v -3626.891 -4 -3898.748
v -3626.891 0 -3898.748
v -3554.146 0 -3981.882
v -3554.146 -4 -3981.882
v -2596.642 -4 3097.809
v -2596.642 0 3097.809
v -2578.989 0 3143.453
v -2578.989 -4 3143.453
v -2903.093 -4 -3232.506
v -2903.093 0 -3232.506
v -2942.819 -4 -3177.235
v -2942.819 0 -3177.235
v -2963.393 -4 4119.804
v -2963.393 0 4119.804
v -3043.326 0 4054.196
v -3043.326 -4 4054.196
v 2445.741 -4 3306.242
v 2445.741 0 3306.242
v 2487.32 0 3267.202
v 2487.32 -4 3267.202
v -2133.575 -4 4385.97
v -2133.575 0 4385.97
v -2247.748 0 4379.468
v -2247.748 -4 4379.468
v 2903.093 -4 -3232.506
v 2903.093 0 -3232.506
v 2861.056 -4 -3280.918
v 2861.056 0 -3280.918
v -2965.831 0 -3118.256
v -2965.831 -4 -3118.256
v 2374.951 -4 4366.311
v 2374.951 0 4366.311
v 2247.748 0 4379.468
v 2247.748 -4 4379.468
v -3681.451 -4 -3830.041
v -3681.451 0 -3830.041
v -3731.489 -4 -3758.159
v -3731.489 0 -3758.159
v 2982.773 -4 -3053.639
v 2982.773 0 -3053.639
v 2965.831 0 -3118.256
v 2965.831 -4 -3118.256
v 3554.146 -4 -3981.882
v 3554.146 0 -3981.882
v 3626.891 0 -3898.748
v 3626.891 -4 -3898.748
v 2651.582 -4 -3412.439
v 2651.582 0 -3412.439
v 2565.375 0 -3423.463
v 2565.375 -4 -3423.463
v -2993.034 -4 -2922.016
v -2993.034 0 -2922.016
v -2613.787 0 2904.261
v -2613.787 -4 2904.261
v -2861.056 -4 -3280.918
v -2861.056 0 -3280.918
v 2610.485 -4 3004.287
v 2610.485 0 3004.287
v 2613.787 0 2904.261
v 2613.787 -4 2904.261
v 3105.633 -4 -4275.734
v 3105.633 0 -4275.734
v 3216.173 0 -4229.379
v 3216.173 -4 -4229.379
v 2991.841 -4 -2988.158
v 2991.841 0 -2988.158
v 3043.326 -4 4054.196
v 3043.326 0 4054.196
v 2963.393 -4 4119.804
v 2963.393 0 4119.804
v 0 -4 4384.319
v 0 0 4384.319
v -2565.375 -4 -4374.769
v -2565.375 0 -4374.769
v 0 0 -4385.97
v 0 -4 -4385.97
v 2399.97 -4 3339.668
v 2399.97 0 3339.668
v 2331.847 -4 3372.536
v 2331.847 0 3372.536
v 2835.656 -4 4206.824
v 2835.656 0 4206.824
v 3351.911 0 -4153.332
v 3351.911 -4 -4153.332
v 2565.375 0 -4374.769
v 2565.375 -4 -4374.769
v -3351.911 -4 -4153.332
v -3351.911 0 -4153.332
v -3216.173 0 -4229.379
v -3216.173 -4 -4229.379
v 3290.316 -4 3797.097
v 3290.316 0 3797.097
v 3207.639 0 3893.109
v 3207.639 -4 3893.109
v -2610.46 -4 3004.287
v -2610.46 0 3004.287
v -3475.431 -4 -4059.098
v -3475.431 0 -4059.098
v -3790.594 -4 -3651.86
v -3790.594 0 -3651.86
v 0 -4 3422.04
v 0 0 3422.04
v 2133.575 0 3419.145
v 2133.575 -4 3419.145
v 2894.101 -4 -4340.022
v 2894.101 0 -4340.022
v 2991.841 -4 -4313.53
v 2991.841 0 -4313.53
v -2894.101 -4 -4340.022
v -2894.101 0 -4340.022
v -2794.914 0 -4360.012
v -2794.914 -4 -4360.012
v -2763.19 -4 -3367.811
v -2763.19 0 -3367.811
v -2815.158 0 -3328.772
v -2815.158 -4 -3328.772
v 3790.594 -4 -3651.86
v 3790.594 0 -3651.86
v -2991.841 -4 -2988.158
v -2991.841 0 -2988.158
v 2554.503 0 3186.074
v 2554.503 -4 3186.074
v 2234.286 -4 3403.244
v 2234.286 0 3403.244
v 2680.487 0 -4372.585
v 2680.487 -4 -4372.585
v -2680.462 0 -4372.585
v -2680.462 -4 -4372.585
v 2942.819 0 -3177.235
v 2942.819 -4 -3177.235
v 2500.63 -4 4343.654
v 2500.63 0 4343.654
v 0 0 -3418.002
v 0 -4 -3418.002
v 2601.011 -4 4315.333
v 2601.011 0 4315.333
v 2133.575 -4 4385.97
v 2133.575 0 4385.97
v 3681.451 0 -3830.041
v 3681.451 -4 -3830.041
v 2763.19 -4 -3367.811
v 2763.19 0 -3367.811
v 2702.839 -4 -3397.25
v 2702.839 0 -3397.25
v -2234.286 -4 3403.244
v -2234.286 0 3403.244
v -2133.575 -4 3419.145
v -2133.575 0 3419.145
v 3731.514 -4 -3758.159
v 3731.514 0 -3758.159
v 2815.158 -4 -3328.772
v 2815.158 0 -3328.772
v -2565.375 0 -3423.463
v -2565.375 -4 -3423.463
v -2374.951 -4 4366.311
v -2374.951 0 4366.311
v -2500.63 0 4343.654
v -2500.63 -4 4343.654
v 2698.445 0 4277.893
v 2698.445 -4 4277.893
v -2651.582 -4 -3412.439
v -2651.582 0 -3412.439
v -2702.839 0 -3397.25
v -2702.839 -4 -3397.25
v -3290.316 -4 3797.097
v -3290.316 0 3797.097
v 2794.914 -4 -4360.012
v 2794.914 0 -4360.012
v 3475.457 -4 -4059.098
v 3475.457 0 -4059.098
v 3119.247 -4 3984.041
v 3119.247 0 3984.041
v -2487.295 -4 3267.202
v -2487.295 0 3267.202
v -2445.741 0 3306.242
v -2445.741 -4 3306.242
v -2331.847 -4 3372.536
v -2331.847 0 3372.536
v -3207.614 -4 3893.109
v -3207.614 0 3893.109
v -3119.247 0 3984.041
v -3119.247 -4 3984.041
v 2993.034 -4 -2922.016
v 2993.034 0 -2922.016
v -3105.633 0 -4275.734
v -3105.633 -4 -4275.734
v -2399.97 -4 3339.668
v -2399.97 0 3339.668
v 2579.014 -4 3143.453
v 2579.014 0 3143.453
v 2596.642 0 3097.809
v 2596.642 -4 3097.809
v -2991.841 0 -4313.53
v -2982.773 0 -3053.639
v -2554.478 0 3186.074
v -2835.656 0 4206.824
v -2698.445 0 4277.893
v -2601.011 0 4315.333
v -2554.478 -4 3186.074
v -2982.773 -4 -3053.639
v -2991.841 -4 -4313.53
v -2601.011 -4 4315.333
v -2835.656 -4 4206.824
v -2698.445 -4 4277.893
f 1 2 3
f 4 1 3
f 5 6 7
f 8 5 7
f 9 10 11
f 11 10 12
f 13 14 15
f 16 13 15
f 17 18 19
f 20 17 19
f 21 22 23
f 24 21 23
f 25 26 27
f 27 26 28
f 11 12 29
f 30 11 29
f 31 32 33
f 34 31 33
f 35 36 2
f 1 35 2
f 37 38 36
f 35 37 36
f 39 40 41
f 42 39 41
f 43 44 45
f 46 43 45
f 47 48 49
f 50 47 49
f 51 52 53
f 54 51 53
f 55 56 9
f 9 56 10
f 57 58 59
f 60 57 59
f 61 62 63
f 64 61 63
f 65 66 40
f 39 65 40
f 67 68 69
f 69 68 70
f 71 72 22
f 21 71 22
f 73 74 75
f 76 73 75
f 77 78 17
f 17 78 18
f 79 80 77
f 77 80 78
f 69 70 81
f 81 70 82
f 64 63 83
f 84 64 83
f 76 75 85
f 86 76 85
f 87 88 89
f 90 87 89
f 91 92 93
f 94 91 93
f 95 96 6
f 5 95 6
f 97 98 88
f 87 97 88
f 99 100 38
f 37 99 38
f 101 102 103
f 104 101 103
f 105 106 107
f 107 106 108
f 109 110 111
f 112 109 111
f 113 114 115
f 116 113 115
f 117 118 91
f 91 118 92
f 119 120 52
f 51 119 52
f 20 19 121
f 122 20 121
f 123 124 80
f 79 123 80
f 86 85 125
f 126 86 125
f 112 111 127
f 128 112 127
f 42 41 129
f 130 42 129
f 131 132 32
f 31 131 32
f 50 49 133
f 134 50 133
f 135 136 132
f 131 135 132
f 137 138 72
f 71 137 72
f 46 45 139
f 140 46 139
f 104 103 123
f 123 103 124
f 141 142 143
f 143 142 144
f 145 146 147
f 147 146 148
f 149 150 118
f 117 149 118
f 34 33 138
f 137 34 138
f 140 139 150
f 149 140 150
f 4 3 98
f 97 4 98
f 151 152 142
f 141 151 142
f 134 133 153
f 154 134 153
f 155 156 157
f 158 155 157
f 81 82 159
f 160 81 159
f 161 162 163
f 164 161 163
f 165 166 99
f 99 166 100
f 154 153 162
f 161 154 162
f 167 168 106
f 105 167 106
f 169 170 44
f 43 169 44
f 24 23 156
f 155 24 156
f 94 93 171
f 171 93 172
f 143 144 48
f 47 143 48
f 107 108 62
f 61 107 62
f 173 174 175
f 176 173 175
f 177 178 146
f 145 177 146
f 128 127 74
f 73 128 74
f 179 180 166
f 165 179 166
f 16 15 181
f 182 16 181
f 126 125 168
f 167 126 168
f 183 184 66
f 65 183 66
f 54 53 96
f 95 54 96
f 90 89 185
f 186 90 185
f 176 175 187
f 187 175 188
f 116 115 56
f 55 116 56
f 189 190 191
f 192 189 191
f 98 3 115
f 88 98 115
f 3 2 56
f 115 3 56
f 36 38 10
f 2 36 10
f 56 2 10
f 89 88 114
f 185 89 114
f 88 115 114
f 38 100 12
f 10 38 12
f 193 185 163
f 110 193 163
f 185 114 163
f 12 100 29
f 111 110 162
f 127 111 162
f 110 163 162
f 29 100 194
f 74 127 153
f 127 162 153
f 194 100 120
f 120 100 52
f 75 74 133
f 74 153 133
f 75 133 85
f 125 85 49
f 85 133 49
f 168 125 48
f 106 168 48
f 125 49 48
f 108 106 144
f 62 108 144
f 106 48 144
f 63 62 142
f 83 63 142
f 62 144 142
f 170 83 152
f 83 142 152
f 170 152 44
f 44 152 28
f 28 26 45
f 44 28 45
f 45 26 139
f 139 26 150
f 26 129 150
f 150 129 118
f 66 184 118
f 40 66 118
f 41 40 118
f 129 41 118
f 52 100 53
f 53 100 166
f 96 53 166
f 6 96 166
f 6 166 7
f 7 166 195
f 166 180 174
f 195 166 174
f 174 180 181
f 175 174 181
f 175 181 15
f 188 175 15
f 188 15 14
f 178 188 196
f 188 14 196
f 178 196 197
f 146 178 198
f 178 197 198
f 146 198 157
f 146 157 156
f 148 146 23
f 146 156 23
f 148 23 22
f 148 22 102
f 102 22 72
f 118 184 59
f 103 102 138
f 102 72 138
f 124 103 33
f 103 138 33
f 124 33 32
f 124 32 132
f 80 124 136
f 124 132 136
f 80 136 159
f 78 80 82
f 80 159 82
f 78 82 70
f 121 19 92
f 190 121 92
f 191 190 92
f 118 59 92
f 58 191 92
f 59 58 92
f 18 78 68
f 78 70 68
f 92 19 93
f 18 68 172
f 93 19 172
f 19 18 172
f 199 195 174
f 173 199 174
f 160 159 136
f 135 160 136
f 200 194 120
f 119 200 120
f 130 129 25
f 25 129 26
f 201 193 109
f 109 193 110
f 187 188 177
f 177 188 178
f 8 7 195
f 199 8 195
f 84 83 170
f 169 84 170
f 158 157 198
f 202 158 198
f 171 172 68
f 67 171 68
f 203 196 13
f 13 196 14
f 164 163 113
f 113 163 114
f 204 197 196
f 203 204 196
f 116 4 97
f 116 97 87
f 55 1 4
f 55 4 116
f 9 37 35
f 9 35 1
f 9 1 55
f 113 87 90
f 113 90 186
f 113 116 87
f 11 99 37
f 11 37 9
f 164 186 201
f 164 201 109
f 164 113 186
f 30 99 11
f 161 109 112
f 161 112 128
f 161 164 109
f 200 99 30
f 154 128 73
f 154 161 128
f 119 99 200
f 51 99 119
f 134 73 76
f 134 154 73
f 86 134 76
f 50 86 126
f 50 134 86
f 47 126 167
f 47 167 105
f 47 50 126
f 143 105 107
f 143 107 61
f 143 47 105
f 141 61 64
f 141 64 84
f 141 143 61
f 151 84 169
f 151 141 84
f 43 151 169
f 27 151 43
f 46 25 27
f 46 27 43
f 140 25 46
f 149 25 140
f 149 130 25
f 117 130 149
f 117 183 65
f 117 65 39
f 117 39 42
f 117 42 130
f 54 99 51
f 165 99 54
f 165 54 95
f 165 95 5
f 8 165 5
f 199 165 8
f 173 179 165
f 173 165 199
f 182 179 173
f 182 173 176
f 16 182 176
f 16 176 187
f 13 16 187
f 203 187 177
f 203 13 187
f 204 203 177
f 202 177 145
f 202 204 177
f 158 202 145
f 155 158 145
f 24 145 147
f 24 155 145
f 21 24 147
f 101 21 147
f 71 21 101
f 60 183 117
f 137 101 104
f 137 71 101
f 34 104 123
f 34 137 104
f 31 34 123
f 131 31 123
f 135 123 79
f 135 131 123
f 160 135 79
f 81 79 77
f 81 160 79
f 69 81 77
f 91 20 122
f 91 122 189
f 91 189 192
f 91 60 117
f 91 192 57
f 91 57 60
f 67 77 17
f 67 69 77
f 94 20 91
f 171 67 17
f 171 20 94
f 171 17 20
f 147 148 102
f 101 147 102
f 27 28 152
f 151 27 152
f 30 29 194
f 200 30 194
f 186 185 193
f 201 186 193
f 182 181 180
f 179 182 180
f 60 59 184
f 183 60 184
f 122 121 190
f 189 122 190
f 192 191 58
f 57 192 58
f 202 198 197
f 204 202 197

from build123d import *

# Parameters (mm, degrees)
F1_DEPTH = 4


with BuildPart() as f1:
    # F0 (on Front) → F1 (new body)
    with BuildSketch(Plane.XZ):
        Polygon((-3207.6136, 3893.1088), (-3290.316, 3797.0968), (-3790.5944, -3651.8596), (-3731.4886, -3758.1586), (-3681.4506, -3830.0406), (-3626.8914, -3898.7476), (-3554.1458, -3981.8818), (-3475.4312, -4059.0978), (-3351.911, -4153.3318), (-3216.1734, -4229.3794), (-3105.6326, -4275.7344), (-2991.8406, -4313.5296), (-2894.1014, -4340.0218), (-2794.9144, -4360.0116), (-2680.462, -4372.5846), (-2565.3746, -4374.769), (0, -4385.9704), (2565.3746, -4374.769), (2680.4874, -4372.5846), (2794.9144, -4360.0116), (2894.1014, -4340.0218), (2991.8406, -4313.5296), (3105.6326, -4275.7344), (3216.1734, -4229.3794), (3351.911, -4153.3318), (3475.4566, -4059.0978), (3554.1458, -3981.8818), (3626.8914, -3898.7476), (3681.4506, -3830.0406), (3731.514, -3758.1586), (3790.5944, -3651.8596), (3290.316, 3797.0968), (3207.639, 3893.1088), (3119.247, 3984.0408), (3043.3264, 4054.1956), (2963.3926, 4119.8038), (2835.656, 4206.8242), (2698.4452, 4277.8934), (2601.0108, 4315.333), (2500.63, 4343.654), (2374.9508, 4366.3108), (2247.7476, 4379.468), (2133.5746, 4385.9704), (0, 4384.3194), (-2133.5746, 4385.9704), (-2247.7476, 4379.468), (-2374.9508, 4366.3108), (-2500.63, 4343.654), (-2601.0108, 4315.333), (-2698.4452, 4277.8934), (-2835.656, 4206.8242), (-2963.3926, 4119.8038), (-3043.3264, 4054.1956), (-3119.247, 3984.0408), align=None)
        Polygon((-2133.5746, 3419.1448), (0, 3422.0404), (2133.5746, 3419.1448), (2234.2856, 3403.2444), (2331.847, 3372.5358), (2399.9698, 3339.6682), (2445.7406, 3306.2418), (2487.3204, 3267.202), (2554.5034, 3186.0744), (2579.0144, 3143.4532), (2596.642, 3097.8094), (2610.485, 3004.2866), (2613.787, 2904.2614), (2993.0344, -2922.016), (2991.8406, -2988.1576), (2982.7728, -3053.6388), (2965.831, -3118.2564), (2942.8186, -3177.2352), (2903.093, -3232.5056), (2861.056, -3280.918), (2815.1582, -3328.7716), (2763.1898, -3367.8114), (2702.8394, -3397.25), (2651.5822, -3412.4392), (2565.3746, -3423.4628), (0, -3418.0018), (-2565.3746, -3423.4628), (-2651.5822, -3412.4392), (-2702.8394, -3397.25), (-2763.1898, -3367.8114), (-2815.1582, -3328.7716), (-2861.056, -3280.918), (-2903.093, -3232.5056), (-2942.8186, -3177.2352), (-2965.831, -3118.2564), (-2982.7728, -3053.6388), (-2991.8406, -2988.1576), (-2993.0344, -2922.016), (-2613.787, 2904.2614), (-2610.4596, 3004.2866), (-2596.642, 3097.8094), (-2578.989, 3143.4532), (-2554.478, 3186.0744), (-2487.295, 3267.202), (-2445.7406, 3306.2418), (-2399.9698, 3339.6682), (-2331.847, 3372.5358), (-2234.2856, 3403.2444), align=None, mode=Mode.SUBTRACT)
    extrude(amount=F1_DEPTH)


solid = f1.part
